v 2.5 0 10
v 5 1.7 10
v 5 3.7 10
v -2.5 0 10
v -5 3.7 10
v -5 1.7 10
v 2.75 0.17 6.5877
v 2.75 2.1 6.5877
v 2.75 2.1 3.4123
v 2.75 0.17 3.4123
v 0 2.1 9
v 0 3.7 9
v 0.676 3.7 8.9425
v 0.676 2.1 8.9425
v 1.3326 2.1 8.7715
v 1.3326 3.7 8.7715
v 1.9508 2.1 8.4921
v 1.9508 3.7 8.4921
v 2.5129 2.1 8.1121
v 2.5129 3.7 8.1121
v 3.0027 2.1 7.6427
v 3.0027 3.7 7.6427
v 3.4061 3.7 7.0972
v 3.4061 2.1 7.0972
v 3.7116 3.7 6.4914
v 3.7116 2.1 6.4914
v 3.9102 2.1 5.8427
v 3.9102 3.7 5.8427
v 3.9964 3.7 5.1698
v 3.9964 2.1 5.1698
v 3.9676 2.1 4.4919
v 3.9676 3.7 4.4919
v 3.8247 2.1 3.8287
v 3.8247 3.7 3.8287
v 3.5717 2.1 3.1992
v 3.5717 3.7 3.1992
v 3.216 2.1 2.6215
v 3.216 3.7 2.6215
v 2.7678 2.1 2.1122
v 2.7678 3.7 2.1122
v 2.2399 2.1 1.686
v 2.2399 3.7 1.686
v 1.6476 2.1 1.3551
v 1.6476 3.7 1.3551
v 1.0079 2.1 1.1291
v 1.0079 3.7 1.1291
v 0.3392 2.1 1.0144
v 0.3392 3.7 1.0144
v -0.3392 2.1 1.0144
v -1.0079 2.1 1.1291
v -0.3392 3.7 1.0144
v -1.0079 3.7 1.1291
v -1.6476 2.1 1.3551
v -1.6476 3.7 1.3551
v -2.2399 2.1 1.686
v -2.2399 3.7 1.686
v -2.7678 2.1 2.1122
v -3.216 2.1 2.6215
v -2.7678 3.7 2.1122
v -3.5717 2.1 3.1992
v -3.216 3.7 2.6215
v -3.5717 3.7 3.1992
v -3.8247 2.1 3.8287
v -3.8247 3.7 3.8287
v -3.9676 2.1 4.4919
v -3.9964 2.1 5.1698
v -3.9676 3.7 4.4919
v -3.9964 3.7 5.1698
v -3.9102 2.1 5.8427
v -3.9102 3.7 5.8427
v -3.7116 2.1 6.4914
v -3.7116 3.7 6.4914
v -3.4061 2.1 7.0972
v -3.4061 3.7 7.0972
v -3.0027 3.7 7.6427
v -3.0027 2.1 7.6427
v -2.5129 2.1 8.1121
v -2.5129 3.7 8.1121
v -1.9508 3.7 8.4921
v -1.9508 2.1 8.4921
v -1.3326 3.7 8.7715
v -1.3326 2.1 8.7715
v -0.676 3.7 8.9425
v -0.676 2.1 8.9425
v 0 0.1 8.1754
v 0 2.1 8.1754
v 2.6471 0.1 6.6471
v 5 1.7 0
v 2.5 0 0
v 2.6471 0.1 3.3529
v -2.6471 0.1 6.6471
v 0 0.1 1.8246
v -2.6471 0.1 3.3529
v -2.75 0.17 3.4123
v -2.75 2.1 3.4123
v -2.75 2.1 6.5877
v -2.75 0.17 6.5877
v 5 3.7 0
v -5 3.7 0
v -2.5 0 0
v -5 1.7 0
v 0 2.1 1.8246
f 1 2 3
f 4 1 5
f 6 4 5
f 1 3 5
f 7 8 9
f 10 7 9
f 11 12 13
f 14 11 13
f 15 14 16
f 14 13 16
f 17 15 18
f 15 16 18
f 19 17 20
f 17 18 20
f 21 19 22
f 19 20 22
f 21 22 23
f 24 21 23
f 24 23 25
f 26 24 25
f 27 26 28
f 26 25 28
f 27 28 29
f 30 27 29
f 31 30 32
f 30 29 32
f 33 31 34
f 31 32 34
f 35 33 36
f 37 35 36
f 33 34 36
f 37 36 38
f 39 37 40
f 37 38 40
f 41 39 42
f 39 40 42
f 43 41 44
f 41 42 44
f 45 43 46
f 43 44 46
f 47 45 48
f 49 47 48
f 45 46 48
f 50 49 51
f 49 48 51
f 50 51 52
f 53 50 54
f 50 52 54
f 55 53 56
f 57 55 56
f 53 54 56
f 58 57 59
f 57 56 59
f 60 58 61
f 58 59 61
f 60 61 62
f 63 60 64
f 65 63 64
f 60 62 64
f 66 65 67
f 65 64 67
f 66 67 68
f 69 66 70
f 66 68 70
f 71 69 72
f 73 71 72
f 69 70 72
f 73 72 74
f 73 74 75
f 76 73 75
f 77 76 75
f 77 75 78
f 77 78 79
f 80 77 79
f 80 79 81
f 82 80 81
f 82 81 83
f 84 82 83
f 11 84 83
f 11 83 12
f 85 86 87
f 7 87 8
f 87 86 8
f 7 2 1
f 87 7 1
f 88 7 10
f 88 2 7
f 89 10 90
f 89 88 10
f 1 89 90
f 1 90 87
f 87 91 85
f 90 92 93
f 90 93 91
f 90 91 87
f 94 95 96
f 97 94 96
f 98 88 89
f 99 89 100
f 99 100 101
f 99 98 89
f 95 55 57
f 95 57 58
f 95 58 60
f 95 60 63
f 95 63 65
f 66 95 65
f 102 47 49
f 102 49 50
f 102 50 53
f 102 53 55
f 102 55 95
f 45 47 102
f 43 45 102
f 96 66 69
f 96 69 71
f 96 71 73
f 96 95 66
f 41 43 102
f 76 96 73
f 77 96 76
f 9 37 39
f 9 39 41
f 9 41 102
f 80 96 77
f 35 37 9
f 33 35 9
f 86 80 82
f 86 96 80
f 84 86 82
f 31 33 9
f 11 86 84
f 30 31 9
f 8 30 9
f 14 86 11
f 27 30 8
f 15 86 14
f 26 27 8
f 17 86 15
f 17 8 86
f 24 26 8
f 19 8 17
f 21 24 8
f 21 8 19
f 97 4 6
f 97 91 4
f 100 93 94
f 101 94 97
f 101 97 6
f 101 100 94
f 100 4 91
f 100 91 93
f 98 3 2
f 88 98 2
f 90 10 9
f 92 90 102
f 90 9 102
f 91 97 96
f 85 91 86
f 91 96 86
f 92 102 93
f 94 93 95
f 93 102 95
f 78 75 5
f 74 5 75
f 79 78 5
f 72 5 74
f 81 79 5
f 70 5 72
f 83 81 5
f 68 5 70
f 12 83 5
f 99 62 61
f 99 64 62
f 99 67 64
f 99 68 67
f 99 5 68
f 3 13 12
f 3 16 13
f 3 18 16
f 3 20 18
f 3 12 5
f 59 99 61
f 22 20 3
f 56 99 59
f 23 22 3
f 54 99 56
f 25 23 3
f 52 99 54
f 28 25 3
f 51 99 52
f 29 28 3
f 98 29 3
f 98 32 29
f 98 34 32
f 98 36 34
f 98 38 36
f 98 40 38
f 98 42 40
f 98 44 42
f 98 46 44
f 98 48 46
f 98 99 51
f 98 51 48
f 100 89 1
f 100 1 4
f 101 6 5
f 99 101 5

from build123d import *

# Parameters (mm, degrees)
EXTRUDE_1_DEPTH     = 10
CUT_EXTRUDE_1_DEPTH = 3.6
SKETCH_3_R          = 4
CUT_EXTRUDE_2_DEPTH = 1.6


with BuildPart() as part:
    # Эскиз1 → Бобышка-Вытянуть1 (new body)
    with BuildSketch(Plane.XY):
        Polygon((2.5, 0), (-2.5, 0), (-5, 1.7), (-5, 3.7), (5, 3.7), (5, 1.7), align=None)
    extrude(amount=EXTRUDE_1_DEPTH)

    # Эскиз2 → Вырез-Вытянуть1 (cut)
    with BuildSketch(Plane(origin=(0, 3.7, 0), x_dir=(1, 0, 0), z_dir=(0, 1, 0))):
        Polygon((2.75, -6.58771324), (2.75, -3.41228676), (0, -1.824573519), (-2.75, -3.41228676), (-2.75, -6.58771324), (0, -8.175426481), align=None)
    extrude(amount=-CUT_EXTRUDE_1_DEPTH, mode=Mode.SUBTRACT)

    # Эскиз3 → Вырез-Вытянуть2 (cut)
    with BuildSketch(Plane(origin=(0, 3.7, 0), x_dir=(1, 0, 0), z_dir=(0, 1, 0))):
        with Locations(Location((0, -5, 0), (0, 0, 270))):
            Circle(SKETCH_3_R)
    extrude(amount=-CUT_EXTRUDE_2_DEPTH, mode=Mode.SUBTRACT)


solid = part.part
